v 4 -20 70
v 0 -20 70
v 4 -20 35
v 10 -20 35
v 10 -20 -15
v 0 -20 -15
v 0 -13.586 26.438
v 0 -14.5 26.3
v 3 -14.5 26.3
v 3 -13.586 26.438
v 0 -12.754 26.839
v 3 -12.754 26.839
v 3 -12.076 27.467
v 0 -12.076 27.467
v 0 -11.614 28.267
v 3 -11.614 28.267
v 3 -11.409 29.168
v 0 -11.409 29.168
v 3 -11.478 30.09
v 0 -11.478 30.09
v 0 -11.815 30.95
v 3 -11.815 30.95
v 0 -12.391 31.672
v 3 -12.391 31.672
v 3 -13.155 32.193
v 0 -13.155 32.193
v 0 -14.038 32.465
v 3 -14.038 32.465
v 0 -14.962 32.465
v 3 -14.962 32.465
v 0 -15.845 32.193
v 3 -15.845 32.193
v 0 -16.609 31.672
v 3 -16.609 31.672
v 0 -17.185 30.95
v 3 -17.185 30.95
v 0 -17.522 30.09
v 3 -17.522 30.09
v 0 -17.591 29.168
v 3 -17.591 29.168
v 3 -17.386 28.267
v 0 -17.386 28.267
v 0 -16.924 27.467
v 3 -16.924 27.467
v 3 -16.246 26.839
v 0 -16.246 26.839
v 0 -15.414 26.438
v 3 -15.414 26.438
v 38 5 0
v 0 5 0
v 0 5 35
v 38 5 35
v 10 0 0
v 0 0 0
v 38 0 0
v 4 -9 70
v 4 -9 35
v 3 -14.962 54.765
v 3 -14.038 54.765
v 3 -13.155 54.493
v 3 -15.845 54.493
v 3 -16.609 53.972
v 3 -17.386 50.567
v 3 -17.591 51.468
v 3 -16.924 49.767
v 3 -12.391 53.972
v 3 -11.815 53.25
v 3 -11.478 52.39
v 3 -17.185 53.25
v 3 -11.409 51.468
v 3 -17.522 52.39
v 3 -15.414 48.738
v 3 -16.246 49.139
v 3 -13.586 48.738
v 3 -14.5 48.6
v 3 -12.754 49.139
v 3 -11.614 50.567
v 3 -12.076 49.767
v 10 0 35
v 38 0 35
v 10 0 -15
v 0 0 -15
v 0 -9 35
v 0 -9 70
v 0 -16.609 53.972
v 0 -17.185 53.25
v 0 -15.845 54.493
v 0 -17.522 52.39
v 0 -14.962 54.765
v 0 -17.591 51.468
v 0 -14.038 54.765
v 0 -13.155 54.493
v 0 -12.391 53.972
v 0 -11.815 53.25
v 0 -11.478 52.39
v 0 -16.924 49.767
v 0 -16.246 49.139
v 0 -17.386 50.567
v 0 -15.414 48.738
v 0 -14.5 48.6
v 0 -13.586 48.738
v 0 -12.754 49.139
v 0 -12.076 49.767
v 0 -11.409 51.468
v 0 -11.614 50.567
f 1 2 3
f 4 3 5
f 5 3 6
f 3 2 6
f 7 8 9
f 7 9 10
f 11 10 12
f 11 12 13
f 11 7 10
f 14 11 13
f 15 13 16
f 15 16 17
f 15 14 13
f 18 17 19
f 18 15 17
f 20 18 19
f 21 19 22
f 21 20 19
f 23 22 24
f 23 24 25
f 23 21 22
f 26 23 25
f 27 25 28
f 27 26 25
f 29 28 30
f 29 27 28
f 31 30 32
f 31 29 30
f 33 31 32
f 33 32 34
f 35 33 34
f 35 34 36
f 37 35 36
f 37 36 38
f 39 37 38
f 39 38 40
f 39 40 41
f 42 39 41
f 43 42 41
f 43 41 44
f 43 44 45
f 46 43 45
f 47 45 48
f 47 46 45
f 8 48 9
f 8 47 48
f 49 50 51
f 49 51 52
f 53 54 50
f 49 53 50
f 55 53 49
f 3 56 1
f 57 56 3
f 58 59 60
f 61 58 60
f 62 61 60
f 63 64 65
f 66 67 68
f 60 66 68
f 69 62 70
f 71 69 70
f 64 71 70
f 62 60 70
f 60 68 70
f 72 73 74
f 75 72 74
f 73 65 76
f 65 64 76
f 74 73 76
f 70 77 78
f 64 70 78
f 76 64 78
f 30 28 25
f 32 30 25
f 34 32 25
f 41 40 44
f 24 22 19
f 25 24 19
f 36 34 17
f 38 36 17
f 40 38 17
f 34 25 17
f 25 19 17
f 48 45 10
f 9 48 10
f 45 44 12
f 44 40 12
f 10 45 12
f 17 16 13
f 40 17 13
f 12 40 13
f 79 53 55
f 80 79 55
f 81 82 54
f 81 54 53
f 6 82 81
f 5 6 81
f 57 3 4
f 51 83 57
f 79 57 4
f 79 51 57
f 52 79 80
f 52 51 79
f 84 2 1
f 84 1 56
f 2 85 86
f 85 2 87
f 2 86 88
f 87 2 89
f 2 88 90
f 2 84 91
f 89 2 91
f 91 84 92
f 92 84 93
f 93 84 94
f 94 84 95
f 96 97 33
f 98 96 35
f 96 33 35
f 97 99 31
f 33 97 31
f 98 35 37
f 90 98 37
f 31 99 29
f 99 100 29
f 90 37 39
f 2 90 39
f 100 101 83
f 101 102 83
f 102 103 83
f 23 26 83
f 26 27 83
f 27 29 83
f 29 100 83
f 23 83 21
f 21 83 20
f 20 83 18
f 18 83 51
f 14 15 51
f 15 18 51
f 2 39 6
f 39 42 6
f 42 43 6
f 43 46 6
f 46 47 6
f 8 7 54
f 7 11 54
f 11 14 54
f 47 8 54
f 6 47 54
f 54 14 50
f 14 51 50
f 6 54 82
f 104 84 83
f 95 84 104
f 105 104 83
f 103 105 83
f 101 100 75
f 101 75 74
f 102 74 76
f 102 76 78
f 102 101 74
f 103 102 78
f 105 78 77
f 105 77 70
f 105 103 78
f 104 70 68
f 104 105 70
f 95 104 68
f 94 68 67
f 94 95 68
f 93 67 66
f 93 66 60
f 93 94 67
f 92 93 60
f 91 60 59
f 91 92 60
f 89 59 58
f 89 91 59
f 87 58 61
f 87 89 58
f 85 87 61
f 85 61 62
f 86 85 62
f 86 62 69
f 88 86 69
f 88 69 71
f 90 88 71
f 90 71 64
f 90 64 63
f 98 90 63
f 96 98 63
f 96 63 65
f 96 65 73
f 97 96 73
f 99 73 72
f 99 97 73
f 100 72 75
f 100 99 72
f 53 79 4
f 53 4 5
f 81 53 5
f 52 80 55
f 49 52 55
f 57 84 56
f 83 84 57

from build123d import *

# Parameters (mm, degrees)
SKETCH_1_W          = 38
SKETCH_1_H          = 35
EXTRUDE_1_DEPTH     = 5
SKETCH_1_14_W       = 10
SKETCH_1_14_H       = 50
EXTRUDE_2_DEPTH     = 20
EXTRUDE_START       = -10
SKETCH_2_W          = 35
SKETCH_2_H          = 11
EXTRUDE_3_DEPTH     = 4
CUT_EXTRUDE_START   = -10
SKETCH_2_3_R        = 3.1
CUT_EXTRUDE_1_DEPTH = 3


with BuildPart() as part:
    # 草图1 → 凸台-拉伸1 (new body)
    with BuildSketch(Plane(origin=(0, 0, 0), x_dir=(1, 0, 0), z_dir=(0, 1, 0))):
        with Locations((19, -17.5)):
            Rectangle(SKETCH_1_W, SKETCH_1_H)
    extrude(amount=EXTRUDE_1_DEPTH)

    # 草图1<14> → 凸台-拉伸2 (add)
    with BuildSketch(Plane(origin=(0, 0, 0), x_dir=(1, 0, 0), z_dir=(0, 1, 0))):
        with Locations((5, -10)):
            Rectangle(SKETCH_1_14_W, SKETCH_1_14_H)
    extrude(amount=-EXTRUDE_2_DEPTH)

    # 草图2 → 凸台-拉伸3 (add)
    with BuildSketch(Plane(origin=(10, 0, 0), x_dir=(0, 0, -1), z_dir=(1, 0, 0)).offset(EXTRUDE_START)):
        with Locations((-52.5, -14.5)):
            Rectangle(SKETCH_2_W, SKETCH_2_H)
    extrude(amount=EXTRUDE_3_DEPTH)

    # 草图2<3> → 切除-拉伸1 (cut)
    with BuildSketch(Plane(origin=(10, 0, 0), x_dir=(0, 0, -1), z_dir=(1, 0, 0)).offset(CUT_EXTRUDE_START)):
        with Locations((-29.4, -14.5)):
            Circle(SKETCH_2_3_R)
        with Locations((-51.7, -14.5)):
            Circle(SKETCH_2_3_R)
    extrude(amount=CUT_EXTRUDE_1_DEPTH, mode=Mode.SUBTRACT)


solid = part.part
